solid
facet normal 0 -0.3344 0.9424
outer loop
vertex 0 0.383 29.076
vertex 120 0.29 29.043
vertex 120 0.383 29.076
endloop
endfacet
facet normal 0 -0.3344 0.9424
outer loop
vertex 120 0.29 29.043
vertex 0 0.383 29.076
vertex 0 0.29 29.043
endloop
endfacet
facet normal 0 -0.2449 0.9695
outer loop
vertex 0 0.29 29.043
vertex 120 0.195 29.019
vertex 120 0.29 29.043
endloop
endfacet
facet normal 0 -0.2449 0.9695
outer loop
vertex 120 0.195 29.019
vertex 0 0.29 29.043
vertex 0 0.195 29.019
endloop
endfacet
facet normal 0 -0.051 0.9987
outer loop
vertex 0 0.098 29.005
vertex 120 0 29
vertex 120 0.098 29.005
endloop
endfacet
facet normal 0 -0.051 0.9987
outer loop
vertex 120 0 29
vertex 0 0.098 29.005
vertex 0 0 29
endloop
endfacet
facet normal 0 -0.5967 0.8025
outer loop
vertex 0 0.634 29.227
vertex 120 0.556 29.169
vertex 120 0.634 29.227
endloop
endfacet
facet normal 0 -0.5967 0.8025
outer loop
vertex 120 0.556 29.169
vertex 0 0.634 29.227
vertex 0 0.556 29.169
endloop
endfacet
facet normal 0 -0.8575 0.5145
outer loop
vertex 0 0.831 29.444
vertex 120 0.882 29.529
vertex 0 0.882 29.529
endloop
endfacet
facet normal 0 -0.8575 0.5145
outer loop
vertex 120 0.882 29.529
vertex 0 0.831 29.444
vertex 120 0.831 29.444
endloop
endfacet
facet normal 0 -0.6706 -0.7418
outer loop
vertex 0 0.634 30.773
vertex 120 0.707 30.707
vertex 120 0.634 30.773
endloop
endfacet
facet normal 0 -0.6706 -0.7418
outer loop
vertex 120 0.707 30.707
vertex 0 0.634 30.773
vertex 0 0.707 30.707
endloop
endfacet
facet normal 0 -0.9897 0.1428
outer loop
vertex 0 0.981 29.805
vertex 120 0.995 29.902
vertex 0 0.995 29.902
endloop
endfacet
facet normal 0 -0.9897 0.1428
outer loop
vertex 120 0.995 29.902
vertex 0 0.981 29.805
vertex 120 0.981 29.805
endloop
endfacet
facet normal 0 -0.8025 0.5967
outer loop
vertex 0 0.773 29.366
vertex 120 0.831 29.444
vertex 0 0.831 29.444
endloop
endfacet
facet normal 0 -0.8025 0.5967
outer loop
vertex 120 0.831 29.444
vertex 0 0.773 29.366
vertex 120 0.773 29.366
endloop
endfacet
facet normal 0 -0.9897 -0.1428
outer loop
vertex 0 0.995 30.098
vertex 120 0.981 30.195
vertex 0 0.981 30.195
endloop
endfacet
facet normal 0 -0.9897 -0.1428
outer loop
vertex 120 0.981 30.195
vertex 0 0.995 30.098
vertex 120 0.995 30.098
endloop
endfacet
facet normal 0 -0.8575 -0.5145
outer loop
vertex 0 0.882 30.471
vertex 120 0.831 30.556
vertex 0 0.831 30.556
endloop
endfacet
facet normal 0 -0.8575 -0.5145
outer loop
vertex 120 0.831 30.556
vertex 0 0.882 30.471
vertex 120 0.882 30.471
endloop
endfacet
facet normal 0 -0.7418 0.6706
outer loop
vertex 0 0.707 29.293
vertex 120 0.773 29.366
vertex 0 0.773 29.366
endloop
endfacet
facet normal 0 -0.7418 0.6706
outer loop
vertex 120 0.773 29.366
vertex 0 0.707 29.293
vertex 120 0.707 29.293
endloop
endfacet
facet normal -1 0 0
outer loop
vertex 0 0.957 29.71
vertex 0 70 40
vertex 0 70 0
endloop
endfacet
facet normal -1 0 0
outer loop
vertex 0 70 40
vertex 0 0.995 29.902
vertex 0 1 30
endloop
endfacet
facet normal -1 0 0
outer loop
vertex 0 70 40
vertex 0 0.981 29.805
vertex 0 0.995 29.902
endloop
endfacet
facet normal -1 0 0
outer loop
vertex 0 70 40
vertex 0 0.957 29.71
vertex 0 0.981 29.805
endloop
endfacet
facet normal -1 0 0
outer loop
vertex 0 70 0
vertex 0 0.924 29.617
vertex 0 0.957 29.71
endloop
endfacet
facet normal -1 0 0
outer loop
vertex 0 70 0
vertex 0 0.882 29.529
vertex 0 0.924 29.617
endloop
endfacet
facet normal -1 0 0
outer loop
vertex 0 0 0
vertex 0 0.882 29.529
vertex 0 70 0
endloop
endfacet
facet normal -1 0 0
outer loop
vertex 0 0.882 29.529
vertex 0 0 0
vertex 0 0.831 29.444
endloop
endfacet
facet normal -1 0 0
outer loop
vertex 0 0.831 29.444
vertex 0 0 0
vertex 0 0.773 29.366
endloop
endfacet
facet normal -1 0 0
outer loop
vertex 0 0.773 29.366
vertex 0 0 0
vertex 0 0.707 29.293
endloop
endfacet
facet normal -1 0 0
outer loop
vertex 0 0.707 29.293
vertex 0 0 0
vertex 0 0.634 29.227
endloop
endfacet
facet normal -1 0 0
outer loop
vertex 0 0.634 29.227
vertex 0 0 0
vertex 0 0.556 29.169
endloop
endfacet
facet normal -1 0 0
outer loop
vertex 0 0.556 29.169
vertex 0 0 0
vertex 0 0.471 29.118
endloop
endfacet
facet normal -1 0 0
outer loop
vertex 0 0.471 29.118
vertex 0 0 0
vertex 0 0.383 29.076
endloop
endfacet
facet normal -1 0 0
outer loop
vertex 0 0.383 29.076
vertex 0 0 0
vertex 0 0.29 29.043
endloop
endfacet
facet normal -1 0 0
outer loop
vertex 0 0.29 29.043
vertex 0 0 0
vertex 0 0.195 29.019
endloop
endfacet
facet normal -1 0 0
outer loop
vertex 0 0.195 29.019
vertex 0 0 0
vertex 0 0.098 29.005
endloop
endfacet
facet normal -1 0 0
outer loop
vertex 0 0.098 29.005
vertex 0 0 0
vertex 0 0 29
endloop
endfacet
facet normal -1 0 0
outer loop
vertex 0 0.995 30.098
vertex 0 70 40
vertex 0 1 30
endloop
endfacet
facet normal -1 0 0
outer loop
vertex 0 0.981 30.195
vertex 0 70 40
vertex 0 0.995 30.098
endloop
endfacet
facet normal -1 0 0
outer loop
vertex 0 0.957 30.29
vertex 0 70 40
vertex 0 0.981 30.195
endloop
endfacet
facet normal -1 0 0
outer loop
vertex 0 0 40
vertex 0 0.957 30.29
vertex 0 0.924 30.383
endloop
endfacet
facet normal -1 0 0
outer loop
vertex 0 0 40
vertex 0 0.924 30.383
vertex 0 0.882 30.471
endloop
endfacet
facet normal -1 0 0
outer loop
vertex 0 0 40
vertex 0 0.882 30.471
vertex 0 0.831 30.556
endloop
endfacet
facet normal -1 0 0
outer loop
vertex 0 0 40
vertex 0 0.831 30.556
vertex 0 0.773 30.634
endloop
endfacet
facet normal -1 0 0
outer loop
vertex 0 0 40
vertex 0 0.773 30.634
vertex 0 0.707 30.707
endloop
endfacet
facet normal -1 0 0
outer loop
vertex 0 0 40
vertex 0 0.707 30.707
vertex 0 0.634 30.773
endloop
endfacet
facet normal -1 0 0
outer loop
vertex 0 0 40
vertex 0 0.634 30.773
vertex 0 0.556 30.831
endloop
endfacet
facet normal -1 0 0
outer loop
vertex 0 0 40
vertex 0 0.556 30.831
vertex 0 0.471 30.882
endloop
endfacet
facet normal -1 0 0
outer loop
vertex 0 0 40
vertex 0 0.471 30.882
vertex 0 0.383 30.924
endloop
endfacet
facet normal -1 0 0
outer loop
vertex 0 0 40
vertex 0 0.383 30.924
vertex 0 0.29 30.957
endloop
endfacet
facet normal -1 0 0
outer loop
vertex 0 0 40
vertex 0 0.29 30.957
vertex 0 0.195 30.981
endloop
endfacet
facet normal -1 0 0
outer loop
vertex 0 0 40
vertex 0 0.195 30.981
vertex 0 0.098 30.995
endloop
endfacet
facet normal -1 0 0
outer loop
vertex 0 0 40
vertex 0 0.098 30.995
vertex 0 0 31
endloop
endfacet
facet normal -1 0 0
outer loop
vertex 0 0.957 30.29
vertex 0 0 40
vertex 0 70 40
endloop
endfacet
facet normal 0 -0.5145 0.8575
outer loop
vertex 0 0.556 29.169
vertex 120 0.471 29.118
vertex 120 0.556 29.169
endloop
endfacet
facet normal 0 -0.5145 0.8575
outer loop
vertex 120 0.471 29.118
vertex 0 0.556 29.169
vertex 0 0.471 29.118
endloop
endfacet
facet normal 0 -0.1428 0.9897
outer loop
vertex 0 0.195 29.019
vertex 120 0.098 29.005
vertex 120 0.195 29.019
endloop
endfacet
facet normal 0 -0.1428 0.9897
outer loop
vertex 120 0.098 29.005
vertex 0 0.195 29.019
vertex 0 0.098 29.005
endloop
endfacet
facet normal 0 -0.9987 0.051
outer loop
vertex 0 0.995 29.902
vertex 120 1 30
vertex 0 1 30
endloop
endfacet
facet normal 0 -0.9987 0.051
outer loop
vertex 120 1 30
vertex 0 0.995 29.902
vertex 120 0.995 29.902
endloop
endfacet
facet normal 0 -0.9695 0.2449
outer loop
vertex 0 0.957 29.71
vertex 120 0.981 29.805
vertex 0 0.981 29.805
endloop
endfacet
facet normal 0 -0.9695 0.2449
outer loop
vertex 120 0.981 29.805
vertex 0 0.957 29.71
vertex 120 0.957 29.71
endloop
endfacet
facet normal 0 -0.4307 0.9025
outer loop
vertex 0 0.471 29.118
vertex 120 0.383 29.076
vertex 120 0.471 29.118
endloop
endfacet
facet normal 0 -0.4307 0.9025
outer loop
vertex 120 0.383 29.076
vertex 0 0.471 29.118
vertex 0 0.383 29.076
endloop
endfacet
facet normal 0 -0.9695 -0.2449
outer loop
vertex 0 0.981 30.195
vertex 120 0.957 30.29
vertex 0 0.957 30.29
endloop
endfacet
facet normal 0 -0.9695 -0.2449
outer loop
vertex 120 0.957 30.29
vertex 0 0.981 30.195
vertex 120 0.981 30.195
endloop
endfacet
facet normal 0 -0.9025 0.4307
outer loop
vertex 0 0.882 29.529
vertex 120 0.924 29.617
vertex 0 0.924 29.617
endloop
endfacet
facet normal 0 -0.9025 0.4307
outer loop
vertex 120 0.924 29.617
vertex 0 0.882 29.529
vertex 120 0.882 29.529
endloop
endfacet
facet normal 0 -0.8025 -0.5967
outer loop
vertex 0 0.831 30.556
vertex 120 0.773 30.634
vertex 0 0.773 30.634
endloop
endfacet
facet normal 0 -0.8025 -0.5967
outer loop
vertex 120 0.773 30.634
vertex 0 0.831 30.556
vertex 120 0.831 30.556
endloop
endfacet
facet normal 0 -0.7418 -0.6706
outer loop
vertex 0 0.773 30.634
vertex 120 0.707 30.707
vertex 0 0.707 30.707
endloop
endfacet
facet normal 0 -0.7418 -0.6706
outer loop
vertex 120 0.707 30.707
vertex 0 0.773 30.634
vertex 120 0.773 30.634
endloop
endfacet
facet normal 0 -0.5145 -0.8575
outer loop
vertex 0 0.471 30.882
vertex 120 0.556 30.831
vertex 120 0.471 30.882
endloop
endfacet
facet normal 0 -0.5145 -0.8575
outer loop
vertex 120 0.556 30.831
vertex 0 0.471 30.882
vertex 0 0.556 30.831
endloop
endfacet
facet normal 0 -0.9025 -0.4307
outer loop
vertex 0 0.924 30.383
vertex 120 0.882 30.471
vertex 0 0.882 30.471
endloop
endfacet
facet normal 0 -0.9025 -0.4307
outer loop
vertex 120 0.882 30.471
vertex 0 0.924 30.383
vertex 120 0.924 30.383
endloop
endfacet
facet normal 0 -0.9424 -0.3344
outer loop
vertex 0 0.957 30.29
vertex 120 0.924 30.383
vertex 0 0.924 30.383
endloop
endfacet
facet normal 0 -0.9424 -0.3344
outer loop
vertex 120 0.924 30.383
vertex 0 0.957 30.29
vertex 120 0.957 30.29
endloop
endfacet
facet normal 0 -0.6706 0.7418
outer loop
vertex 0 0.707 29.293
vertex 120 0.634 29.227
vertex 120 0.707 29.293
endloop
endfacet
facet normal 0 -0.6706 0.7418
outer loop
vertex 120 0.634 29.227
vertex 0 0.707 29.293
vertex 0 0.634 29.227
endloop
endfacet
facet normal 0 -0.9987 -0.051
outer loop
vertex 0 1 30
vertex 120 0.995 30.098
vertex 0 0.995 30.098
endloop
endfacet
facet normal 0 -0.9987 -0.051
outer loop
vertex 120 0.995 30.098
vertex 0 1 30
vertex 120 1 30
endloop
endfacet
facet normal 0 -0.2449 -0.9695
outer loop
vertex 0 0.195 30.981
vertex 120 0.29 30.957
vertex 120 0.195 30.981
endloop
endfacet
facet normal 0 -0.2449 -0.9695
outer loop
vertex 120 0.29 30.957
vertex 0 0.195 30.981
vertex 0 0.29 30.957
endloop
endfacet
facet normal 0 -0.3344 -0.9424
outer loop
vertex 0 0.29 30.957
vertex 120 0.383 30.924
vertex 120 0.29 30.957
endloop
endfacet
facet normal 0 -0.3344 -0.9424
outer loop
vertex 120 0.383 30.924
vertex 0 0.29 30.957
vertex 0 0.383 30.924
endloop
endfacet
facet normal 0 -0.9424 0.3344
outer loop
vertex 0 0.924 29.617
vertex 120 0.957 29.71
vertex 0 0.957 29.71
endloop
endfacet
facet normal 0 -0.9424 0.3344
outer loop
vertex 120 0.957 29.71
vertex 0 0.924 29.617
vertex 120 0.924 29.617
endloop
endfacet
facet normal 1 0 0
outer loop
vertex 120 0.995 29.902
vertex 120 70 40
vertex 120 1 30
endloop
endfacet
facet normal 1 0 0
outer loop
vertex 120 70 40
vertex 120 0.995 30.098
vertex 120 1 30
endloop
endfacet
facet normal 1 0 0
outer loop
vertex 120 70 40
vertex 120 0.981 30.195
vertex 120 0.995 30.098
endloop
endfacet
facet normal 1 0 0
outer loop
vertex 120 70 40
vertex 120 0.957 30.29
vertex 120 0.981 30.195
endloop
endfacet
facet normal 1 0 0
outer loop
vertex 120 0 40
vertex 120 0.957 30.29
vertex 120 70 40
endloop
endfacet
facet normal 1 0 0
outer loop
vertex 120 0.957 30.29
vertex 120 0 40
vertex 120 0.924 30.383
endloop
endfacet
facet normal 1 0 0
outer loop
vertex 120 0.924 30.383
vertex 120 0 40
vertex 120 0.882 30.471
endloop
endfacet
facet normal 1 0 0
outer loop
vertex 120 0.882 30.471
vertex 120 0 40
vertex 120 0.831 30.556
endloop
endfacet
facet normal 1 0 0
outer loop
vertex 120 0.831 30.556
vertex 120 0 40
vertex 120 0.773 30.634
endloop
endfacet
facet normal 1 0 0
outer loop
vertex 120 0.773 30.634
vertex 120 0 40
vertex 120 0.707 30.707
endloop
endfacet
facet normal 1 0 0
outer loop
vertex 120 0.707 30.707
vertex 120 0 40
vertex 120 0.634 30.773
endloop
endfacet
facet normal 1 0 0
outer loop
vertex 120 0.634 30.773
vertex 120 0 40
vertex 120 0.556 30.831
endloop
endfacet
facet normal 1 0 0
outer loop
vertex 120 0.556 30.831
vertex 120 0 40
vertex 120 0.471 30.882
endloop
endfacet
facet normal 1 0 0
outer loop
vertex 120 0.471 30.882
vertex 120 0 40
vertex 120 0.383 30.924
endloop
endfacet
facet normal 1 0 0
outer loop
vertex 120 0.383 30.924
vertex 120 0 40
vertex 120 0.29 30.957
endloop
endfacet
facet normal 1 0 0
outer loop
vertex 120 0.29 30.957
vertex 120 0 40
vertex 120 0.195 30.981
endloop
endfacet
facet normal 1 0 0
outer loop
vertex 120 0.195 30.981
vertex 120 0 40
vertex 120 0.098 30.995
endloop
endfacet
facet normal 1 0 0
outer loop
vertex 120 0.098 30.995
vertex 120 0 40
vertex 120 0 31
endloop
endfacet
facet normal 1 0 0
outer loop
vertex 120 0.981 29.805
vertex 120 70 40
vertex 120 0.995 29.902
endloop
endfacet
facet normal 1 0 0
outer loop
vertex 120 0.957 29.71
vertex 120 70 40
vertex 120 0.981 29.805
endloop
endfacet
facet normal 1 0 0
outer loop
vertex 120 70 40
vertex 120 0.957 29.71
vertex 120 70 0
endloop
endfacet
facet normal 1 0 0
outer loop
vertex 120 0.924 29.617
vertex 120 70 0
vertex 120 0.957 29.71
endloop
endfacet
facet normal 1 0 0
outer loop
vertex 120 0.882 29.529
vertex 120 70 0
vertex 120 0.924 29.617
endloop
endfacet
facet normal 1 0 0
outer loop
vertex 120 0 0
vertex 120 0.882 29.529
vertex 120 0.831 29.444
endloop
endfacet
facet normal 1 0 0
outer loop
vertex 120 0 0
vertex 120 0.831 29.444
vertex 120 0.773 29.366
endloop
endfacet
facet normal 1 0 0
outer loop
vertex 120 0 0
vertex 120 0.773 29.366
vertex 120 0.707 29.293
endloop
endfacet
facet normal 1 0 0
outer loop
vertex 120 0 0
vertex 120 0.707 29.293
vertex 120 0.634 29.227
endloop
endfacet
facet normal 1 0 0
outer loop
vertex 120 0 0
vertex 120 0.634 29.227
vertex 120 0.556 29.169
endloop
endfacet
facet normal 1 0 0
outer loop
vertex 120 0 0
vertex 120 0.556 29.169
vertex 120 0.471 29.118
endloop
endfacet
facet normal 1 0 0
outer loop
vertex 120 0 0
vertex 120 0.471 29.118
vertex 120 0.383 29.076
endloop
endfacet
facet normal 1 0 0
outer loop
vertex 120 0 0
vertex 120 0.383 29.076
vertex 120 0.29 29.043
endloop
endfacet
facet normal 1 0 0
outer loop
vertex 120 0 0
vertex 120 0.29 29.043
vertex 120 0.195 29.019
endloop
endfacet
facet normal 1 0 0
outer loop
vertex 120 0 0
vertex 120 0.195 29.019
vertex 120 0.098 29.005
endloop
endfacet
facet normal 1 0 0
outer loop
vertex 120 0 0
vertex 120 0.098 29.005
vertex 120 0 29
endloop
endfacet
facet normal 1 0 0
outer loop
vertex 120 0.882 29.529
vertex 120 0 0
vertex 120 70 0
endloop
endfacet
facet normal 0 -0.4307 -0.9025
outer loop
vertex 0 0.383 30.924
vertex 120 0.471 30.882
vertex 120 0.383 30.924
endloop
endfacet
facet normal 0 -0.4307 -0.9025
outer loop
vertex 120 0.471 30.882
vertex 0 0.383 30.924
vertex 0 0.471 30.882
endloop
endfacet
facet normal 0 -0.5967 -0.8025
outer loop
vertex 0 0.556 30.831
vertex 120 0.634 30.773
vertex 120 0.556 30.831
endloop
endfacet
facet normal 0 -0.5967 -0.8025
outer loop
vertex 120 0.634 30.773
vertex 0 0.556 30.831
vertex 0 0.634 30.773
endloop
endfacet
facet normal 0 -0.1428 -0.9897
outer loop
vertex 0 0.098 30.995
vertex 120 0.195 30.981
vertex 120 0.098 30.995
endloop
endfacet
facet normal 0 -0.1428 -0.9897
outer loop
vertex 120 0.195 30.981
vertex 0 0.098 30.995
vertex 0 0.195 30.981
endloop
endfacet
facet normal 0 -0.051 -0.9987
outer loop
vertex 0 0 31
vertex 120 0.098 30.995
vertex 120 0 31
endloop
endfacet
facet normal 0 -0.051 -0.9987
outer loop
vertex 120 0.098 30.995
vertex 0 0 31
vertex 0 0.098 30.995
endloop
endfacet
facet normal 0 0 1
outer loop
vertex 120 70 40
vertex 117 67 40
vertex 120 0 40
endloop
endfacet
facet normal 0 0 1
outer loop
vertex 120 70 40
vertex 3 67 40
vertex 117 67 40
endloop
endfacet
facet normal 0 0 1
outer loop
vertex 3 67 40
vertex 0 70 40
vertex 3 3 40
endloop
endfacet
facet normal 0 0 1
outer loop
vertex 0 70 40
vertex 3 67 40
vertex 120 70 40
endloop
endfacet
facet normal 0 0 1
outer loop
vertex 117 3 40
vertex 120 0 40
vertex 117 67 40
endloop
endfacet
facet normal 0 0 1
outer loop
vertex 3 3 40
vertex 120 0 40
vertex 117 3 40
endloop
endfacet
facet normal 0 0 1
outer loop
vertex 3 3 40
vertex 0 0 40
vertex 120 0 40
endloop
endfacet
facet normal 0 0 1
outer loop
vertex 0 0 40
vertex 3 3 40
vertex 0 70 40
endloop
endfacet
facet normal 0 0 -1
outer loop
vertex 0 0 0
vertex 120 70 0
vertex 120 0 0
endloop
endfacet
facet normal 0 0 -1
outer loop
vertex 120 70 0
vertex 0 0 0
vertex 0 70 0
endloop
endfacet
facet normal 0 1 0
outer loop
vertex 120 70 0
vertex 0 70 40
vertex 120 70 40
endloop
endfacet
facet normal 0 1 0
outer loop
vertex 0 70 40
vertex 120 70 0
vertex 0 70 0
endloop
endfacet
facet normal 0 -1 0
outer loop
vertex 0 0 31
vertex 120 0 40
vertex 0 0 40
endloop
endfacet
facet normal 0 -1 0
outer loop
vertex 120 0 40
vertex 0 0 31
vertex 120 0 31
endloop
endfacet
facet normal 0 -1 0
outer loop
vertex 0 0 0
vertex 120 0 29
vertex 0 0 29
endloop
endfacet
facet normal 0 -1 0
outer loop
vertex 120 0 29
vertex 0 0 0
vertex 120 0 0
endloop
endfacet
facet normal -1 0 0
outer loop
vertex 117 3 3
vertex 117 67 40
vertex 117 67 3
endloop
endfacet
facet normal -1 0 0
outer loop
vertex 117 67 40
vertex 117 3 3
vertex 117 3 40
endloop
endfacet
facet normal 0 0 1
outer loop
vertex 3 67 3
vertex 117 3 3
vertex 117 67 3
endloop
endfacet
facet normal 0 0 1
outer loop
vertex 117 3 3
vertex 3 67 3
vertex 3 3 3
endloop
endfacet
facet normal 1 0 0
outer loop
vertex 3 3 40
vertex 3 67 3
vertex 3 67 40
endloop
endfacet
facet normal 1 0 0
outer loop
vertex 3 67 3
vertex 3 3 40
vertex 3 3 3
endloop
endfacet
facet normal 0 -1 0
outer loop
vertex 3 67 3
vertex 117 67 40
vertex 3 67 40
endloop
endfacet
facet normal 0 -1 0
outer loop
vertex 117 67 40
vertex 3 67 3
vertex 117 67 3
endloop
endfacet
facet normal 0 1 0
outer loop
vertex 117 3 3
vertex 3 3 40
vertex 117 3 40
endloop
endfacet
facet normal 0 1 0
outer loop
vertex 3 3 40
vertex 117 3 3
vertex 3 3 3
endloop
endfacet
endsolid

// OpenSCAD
// Mini horizontal gel-electrophoresis buffer tank.
// Outer dimensions: 120 (X) x 70 (Y) x 40 (Z).
// Wall thickness: 3 mm. Floor thickness: 3 mm.
// Inner floor height: 3 mm.
// Raised platform: 60 mm long (X), full inner width (Y), top at Z=13.
// Electrode holes: 2 mm diameter, horizontal along X, at Y=0, Z=30.

$fn = 64;

// Outer dimensions
X_out = 120;
Y_out = 70;
Z_out = 40;

// Thicknesses
wall_t = 3;
floor_t = 3;

// Inner dimensions
X_in  = X_out - 2 * wall_t;
Y_in  = Y_out - 2 * wall_t;
Z_in  = Z_out - floor_t;

// Platform dimensions
plat_len = 60;
plat_w   = Y_in;
plat_top_z = 13;

// Electrode hole specs
hole_d = 2;
hole_y = 0;
hole_z = 30;

difference() {
    // 1. Outer Shell (Solid block)
    translate([0, 0, 0]) cube([X_out, Y_out, Z_out]);

    // 2. Inner Void (Subtract this to make it hollow)
    // The void starts at the inner floor level (Z = floor_t = 3).
    // It extends up to the top of the tank (Z = Z_out = 40).
    translate([wall_t, wall_t, floor_t]) cube([X_in, Y_in, Z_out - floor_t]);

    // 3. Raised Platform
    // Position: Centred in X, full width in Y, height from floor to plat_top_z.
    // Base Z = floor_t (3). Top Z = plat_top_z (13).
    // The platform sits inside the void, so we subtract it from the solid.
    translate([
        (X_out - plat_len) / 2, 
        wall_t, 
        floor_t
    ]) cube([plat_len, plat_w, plat_top_z - floor_t]);

    // 4. Electrode Holes
    // Horizontal holes along X axis.
    // Position: Y = hole_y, Z = hole_z.
    // Since the hole is horizontal along X, the cylinder axis is X.
    // We need to rotate the cylinder 90 deg around Y to point along X.
    for (side = [-1, 1]) {
        translate([
            0, 
            side * hole_y, 
            hole_z
        ]) rotate([0, 90, 0]) cylinder(h = X_out, d = hole_d);
    }
}
